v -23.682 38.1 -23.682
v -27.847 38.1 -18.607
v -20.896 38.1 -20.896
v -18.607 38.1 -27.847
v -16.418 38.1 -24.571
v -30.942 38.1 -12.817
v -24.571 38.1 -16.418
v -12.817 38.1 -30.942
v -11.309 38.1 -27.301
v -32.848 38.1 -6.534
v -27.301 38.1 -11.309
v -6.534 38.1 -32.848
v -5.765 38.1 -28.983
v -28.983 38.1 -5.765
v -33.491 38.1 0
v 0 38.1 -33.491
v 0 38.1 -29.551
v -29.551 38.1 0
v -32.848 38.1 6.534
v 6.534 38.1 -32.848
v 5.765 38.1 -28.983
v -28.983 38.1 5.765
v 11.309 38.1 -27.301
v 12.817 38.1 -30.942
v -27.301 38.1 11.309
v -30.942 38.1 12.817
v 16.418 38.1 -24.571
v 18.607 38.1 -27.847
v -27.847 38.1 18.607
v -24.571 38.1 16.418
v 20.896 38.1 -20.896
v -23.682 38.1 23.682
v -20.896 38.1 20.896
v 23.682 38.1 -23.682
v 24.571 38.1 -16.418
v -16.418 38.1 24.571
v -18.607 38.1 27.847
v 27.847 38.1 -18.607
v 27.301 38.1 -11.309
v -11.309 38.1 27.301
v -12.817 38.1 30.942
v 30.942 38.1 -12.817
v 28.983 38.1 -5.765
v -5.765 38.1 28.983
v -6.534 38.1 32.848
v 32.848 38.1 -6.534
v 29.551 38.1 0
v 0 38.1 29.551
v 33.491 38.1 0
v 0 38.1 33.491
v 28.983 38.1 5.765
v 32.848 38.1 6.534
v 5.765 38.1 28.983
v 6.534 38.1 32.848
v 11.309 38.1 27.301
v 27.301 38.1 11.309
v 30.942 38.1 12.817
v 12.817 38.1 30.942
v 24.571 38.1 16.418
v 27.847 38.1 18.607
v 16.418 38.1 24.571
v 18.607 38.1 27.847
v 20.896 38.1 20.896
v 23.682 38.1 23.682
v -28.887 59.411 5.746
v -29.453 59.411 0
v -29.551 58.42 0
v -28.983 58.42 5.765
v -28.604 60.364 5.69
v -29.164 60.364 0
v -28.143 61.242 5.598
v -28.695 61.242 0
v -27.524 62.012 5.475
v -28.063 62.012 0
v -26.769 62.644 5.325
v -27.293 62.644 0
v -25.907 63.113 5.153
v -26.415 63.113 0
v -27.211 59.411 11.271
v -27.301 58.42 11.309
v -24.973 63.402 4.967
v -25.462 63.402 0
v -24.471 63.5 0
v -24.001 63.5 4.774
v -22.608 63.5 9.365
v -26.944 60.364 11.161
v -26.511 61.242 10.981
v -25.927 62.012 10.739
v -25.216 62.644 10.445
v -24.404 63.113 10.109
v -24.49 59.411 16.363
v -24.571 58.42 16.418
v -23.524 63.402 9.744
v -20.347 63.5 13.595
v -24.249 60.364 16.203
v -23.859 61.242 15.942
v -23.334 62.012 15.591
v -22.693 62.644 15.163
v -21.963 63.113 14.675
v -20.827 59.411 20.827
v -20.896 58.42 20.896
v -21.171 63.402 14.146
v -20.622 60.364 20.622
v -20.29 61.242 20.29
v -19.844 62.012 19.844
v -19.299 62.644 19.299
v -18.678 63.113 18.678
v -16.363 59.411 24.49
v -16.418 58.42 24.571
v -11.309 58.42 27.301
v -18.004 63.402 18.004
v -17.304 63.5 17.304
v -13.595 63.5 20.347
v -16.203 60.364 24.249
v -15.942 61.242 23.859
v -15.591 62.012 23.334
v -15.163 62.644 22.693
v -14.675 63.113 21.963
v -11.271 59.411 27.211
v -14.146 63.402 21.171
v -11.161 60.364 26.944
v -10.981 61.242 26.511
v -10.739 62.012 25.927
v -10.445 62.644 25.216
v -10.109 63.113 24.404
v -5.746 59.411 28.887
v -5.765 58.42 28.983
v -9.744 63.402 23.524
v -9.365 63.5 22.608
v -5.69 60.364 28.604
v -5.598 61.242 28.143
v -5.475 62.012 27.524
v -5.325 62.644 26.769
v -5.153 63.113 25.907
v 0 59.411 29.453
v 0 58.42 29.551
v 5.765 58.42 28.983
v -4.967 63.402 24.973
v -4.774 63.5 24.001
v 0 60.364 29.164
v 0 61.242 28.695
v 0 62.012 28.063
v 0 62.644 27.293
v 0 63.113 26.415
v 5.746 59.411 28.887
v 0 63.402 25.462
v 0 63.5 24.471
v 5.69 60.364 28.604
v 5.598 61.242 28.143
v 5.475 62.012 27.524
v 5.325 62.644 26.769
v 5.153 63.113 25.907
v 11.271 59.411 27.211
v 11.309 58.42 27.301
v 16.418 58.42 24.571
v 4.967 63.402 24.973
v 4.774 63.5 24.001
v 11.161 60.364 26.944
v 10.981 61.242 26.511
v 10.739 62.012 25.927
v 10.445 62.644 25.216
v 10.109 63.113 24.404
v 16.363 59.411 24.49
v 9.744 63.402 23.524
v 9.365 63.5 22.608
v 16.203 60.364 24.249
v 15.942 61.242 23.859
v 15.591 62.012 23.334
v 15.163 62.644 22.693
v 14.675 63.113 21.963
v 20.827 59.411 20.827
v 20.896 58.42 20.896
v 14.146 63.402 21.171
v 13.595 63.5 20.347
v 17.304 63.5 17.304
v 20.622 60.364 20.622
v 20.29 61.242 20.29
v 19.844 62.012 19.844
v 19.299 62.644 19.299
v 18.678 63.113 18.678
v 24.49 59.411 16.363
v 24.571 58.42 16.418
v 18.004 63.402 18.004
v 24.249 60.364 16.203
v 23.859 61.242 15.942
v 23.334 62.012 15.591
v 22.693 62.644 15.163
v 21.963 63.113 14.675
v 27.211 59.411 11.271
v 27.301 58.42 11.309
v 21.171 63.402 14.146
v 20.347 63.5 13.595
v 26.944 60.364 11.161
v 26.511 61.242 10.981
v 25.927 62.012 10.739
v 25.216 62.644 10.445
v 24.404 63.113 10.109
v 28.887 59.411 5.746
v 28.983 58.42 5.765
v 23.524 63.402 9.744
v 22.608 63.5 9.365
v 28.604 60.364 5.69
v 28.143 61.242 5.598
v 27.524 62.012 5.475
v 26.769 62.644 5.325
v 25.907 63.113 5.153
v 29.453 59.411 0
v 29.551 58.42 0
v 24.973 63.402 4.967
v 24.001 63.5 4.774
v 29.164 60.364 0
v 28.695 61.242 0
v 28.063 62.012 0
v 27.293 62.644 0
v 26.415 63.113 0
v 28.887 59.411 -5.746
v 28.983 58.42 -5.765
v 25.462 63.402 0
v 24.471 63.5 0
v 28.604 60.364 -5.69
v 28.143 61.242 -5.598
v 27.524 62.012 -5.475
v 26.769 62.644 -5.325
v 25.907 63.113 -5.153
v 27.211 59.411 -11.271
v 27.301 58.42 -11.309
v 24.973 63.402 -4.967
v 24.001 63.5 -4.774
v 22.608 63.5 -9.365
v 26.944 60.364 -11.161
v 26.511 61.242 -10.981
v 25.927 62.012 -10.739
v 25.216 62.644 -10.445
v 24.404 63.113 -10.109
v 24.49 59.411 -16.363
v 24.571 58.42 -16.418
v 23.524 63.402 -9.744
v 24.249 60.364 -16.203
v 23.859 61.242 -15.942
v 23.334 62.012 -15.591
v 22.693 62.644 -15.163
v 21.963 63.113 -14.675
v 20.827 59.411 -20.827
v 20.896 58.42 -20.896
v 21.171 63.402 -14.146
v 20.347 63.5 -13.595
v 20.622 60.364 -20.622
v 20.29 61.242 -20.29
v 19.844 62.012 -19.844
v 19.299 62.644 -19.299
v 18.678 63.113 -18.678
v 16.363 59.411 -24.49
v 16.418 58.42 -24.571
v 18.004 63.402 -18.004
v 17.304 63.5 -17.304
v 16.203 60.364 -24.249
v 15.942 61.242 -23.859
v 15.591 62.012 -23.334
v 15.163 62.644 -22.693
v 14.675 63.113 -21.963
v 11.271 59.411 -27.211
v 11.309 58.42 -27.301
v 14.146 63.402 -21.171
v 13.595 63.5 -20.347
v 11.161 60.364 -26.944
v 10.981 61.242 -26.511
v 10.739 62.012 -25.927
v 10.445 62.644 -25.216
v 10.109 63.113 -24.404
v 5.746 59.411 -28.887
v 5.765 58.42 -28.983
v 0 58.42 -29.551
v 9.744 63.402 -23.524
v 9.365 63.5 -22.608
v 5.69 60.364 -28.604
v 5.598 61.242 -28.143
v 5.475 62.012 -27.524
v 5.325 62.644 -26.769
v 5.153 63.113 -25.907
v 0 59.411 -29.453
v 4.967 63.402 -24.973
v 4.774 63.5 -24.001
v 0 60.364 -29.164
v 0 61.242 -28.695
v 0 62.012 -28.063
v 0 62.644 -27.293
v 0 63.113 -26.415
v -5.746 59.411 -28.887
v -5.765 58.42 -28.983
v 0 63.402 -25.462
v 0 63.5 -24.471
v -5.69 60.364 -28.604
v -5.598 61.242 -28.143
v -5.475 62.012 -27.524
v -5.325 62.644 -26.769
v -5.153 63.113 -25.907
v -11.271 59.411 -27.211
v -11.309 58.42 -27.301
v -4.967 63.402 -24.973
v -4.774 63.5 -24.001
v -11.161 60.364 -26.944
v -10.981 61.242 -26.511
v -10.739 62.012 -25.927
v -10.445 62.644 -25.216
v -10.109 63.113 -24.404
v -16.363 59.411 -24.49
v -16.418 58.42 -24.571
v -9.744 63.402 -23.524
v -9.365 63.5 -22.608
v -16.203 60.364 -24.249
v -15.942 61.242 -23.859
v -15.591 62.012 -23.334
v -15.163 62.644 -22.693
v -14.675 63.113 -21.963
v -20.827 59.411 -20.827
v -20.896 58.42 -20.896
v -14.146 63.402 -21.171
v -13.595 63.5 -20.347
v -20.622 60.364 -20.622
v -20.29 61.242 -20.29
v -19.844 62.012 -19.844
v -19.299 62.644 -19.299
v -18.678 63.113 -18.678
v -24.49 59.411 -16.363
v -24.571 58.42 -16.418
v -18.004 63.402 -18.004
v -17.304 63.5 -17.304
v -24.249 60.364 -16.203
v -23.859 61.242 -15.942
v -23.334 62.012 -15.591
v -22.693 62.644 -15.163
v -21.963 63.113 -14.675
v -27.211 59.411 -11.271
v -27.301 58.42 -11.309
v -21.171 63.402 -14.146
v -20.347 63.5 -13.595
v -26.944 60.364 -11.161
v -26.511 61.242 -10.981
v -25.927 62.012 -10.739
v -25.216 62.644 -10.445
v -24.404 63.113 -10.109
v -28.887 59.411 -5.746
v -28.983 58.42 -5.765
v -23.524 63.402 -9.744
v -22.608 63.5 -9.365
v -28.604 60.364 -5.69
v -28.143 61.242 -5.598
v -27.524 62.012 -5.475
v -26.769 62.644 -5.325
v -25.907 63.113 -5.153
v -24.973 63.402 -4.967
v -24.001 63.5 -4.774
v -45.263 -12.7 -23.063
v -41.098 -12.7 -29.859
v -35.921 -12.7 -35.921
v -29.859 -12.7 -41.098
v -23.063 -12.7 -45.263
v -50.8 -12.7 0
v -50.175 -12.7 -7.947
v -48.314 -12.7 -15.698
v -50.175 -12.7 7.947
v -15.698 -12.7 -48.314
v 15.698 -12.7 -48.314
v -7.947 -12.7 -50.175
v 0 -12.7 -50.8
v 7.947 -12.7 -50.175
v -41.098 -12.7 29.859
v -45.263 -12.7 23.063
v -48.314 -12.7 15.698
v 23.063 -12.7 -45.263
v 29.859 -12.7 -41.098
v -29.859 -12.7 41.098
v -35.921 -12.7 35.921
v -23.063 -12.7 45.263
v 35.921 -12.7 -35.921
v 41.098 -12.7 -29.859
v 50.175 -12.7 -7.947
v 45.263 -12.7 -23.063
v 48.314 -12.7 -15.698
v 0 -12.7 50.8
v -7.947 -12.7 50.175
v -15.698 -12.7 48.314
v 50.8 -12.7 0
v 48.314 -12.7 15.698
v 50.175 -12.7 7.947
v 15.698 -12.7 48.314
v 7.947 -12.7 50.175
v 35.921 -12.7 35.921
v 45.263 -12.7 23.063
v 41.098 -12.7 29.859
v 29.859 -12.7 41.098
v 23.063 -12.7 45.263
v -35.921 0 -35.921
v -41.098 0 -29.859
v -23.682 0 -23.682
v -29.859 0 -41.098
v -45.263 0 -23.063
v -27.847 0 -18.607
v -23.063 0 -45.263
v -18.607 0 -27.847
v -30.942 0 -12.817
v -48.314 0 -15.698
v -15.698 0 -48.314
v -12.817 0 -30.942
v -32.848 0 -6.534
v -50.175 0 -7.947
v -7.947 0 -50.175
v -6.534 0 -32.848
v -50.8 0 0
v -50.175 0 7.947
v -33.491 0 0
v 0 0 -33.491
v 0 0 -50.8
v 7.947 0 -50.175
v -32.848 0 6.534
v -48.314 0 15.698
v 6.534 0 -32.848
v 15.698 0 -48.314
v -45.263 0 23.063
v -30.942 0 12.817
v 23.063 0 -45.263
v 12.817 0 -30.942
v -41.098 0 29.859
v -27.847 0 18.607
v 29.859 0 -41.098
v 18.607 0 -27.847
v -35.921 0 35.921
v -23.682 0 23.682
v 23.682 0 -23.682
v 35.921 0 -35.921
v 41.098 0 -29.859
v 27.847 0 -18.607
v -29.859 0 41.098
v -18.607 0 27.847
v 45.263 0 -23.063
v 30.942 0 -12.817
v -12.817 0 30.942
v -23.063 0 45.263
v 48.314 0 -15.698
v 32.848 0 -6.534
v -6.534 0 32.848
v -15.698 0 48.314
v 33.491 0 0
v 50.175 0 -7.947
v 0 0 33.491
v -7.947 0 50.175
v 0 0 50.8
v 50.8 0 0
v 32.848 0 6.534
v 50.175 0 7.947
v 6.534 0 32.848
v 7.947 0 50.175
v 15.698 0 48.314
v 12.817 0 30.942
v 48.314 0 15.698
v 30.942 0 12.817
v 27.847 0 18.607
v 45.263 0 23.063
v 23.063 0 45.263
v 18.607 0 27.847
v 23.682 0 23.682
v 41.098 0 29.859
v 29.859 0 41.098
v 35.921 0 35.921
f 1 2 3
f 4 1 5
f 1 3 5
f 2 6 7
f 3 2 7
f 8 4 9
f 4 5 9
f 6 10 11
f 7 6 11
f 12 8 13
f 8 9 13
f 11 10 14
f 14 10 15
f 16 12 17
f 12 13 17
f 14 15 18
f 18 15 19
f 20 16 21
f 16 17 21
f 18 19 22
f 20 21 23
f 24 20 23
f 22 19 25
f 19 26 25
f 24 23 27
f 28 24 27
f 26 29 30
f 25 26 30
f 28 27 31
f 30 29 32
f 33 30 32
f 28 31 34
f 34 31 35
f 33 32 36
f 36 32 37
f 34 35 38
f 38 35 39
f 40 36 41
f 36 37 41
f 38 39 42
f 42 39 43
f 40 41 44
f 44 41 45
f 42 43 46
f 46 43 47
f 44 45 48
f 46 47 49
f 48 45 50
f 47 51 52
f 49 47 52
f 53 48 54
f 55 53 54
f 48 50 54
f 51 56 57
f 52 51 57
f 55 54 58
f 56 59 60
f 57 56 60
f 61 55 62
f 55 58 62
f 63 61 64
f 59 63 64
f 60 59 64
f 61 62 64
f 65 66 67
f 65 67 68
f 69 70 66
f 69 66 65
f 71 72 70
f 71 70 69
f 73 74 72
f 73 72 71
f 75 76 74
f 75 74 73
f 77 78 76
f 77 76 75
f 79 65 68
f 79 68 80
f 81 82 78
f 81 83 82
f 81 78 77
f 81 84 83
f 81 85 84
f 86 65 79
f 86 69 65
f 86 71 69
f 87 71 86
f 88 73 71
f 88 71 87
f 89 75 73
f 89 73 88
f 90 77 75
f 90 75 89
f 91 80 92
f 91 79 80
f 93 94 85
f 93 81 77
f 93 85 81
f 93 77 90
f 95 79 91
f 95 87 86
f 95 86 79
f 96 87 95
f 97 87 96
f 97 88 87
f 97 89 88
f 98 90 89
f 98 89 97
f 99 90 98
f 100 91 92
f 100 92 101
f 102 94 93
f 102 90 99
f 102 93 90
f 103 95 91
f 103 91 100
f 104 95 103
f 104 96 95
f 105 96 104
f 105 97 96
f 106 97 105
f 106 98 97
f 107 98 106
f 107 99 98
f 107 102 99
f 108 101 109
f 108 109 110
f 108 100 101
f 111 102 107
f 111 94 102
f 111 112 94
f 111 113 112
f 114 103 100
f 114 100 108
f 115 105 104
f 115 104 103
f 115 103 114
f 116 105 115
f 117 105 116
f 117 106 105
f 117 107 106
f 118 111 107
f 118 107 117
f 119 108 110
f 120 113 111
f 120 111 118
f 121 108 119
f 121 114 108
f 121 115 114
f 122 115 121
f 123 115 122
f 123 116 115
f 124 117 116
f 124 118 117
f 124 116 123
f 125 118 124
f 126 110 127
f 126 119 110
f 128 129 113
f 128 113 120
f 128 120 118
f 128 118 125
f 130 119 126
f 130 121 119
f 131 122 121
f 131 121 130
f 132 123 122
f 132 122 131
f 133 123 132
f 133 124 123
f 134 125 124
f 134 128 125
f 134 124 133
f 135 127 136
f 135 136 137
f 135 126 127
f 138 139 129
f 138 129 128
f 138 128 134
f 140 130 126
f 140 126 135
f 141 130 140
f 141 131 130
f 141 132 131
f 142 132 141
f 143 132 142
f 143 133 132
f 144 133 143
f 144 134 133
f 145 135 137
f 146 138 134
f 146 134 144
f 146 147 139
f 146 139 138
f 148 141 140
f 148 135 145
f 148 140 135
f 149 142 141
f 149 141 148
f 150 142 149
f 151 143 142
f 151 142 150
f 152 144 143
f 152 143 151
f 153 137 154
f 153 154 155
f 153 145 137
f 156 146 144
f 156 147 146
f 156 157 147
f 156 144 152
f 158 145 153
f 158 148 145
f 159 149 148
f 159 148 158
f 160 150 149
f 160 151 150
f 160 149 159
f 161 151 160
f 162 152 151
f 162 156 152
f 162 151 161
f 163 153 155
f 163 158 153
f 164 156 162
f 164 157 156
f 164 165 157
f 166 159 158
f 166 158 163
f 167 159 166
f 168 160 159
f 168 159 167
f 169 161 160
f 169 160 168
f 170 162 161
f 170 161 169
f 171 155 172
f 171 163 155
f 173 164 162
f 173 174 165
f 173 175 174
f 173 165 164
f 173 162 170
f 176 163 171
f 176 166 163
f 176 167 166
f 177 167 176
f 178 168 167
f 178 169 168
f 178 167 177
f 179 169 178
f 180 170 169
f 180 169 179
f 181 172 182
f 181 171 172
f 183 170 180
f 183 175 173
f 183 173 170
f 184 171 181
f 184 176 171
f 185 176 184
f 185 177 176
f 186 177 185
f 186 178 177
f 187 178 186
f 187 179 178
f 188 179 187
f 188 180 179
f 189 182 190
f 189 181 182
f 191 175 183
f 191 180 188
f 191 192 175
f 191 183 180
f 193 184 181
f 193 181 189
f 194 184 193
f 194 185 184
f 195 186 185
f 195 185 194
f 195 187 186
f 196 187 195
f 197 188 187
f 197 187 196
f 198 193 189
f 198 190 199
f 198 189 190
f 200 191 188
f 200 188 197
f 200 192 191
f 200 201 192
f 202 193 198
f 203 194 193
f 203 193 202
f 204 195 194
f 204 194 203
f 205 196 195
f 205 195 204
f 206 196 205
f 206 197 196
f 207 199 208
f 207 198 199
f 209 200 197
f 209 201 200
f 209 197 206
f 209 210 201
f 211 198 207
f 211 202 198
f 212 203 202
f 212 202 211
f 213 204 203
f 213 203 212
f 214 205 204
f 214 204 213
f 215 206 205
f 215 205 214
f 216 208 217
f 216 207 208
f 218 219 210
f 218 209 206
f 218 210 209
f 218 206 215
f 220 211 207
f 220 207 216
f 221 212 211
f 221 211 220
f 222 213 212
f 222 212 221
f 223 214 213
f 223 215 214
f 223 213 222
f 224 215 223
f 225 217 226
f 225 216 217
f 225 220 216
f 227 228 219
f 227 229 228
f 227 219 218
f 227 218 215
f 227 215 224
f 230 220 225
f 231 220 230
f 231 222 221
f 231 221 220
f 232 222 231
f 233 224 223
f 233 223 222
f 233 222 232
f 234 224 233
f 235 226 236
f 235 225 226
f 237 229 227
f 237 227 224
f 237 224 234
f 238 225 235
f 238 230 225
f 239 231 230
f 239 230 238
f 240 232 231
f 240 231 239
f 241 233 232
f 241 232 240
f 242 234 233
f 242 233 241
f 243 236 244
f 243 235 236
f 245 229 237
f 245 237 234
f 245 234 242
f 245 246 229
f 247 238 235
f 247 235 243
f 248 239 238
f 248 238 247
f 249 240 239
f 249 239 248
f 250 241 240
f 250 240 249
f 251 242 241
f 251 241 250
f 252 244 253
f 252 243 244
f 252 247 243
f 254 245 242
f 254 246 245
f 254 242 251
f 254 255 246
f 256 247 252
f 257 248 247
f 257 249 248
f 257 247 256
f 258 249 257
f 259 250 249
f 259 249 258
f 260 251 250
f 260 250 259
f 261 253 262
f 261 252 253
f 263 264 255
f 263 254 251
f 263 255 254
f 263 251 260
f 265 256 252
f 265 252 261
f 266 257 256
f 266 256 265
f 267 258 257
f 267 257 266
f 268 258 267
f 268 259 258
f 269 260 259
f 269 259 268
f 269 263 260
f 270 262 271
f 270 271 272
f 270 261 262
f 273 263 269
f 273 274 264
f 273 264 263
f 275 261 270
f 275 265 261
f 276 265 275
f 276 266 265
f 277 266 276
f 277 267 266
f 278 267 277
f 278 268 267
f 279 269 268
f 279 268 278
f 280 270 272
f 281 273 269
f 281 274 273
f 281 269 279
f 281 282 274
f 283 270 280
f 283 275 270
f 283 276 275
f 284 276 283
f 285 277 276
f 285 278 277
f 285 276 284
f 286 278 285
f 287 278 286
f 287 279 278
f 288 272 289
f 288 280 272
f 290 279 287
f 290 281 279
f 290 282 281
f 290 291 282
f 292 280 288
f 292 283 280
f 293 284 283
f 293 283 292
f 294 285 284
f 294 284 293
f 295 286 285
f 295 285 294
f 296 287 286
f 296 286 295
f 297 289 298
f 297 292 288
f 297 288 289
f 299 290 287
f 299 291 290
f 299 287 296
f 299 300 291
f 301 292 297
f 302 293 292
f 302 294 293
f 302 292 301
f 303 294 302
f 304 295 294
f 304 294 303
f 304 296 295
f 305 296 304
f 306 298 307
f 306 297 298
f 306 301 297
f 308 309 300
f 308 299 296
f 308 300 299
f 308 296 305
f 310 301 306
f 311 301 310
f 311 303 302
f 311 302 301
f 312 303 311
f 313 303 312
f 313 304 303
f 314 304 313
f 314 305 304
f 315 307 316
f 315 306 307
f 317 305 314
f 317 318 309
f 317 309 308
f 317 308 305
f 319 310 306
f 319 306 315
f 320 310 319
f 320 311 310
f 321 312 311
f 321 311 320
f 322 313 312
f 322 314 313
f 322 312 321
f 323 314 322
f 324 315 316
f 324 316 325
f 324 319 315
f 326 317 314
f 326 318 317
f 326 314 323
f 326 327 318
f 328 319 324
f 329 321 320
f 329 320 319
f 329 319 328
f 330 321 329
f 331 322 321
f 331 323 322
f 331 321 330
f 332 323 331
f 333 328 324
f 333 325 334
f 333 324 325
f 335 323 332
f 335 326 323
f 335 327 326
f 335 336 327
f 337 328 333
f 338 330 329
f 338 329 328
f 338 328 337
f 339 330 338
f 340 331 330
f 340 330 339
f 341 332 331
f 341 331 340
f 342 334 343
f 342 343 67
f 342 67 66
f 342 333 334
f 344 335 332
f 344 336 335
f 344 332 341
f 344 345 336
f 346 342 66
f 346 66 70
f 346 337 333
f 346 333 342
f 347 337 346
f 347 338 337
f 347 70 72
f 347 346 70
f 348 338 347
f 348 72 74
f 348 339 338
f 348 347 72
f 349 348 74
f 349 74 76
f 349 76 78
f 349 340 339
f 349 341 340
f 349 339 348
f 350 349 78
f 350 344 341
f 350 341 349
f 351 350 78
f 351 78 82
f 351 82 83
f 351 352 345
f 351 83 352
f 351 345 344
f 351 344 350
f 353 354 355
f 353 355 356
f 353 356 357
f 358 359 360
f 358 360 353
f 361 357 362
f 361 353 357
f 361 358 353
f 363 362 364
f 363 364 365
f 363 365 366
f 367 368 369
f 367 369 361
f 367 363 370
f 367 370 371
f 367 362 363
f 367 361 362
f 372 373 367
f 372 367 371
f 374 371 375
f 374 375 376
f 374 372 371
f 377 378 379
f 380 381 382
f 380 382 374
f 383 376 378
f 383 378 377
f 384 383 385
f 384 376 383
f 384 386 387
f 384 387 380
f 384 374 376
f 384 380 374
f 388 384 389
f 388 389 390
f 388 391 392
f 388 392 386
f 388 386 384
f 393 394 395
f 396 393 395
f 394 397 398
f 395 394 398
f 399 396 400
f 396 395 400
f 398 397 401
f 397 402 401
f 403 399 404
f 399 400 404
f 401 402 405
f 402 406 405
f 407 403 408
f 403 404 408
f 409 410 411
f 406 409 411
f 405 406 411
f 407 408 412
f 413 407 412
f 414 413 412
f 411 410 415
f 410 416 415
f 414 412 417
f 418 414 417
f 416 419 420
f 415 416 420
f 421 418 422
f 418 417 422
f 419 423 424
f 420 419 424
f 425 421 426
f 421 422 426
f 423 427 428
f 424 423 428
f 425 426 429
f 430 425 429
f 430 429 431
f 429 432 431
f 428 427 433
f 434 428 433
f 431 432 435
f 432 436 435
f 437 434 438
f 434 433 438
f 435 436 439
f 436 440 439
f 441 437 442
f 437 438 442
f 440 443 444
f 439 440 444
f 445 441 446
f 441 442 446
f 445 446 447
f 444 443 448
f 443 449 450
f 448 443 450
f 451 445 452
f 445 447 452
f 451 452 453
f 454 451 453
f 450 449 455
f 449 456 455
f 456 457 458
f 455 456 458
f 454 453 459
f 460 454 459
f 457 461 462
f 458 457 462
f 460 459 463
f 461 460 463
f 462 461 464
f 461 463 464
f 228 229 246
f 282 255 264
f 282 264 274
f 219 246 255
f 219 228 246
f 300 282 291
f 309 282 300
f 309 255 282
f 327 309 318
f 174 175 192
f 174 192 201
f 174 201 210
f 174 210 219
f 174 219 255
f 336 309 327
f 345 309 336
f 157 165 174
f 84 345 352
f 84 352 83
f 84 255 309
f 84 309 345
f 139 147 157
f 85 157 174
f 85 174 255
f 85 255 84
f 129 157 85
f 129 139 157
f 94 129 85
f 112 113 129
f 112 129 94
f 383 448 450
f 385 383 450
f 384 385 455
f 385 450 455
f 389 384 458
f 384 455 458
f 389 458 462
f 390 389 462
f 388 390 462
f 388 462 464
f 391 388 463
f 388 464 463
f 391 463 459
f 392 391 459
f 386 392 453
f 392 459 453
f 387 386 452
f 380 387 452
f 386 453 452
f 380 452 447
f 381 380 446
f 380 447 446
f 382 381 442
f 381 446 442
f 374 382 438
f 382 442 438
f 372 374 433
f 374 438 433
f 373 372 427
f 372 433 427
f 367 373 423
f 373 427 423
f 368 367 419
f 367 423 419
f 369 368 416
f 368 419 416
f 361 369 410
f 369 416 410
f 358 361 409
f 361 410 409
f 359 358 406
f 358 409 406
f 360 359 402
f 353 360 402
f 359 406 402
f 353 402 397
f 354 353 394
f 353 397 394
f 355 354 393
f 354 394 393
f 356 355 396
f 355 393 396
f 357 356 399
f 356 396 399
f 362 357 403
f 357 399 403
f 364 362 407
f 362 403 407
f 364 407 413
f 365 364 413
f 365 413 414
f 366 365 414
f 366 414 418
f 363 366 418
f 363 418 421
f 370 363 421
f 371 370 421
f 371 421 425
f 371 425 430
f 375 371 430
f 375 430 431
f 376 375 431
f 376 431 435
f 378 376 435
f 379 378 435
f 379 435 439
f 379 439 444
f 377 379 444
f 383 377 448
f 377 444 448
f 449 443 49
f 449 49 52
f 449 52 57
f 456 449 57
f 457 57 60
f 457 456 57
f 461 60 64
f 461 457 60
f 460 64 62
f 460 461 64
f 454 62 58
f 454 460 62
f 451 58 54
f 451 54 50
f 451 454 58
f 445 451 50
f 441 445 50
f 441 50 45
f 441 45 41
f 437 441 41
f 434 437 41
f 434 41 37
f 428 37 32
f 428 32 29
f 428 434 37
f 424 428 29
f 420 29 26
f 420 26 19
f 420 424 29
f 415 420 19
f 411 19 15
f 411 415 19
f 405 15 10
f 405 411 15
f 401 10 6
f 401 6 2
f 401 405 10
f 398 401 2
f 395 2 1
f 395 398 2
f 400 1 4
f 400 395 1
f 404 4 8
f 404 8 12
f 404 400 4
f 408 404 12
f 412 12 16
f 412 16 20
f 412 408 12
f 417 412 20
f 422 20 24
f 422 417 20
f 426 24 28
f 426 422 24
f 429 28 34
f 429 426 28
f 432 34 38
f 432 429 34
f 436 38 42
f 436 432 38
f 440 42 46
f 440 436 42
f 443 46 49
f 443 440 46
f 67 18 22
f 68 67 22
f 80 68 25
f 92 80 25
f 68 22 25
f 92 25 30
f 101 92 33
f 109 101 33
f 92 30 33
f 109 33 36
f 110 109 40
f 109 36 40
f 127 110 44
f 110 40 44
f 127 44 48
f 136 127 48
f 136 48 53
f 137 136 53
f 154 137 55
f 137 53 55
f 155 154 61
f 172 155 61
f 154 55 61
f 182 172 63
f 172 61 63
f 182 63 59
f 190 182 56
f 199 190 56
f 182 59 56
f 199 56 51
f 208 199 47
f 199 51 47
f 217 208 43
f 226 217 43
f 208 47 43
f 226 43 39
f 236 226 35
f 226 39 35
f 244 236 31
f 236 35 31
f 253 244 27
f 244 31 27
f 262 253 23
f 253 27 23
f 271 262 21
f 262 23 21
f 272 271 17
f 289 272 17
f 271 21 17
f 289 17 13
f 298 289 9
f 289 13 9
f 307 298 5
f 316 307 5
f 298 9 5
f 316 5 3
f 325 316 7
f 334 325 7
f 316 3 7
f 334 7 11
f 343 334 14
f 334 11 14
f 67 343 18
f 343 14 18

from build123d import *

# Parameters (mm, degrees)
F0_R     = 50.8
F1_DEPTH = 12.7
F2_R     = 33.491229
F3_DEPTH = 38.1
F4_R     = 29.55091
F5_DEPTH = 25.4
F6_R     = 5.08


with BuildPart() as f1:
    # F0 (on Front) → F1 (new body)
    with BuildSketch(Plane.XZ):
        Circle(F0_R)
    extrude(amount=F1_DEPTH)

    # F2 (on Front) → F3 (join)
    with BuildSketch(Plane.XZ):
        Circle(F2_R)
    extrude(amount=-F3_DEPTH)

    # F4 (on face) → F5 (join)
    with BuildSketch(Plane(origin=(0, 38.1, 0), x_dir=(-1, 0, 0), z_dir=(0, 1, 0))):
        Circle(F4_R)
    extrude(amount=F5_DEPTH)

    # F6
    f6_edges = [f1.edges().sort_by_distance(p)[0] for p in [
        (29.55091, 63.5, 0),
    ]]
    fillet(f6_edges, radius=F6_R)


solid = f1.part
